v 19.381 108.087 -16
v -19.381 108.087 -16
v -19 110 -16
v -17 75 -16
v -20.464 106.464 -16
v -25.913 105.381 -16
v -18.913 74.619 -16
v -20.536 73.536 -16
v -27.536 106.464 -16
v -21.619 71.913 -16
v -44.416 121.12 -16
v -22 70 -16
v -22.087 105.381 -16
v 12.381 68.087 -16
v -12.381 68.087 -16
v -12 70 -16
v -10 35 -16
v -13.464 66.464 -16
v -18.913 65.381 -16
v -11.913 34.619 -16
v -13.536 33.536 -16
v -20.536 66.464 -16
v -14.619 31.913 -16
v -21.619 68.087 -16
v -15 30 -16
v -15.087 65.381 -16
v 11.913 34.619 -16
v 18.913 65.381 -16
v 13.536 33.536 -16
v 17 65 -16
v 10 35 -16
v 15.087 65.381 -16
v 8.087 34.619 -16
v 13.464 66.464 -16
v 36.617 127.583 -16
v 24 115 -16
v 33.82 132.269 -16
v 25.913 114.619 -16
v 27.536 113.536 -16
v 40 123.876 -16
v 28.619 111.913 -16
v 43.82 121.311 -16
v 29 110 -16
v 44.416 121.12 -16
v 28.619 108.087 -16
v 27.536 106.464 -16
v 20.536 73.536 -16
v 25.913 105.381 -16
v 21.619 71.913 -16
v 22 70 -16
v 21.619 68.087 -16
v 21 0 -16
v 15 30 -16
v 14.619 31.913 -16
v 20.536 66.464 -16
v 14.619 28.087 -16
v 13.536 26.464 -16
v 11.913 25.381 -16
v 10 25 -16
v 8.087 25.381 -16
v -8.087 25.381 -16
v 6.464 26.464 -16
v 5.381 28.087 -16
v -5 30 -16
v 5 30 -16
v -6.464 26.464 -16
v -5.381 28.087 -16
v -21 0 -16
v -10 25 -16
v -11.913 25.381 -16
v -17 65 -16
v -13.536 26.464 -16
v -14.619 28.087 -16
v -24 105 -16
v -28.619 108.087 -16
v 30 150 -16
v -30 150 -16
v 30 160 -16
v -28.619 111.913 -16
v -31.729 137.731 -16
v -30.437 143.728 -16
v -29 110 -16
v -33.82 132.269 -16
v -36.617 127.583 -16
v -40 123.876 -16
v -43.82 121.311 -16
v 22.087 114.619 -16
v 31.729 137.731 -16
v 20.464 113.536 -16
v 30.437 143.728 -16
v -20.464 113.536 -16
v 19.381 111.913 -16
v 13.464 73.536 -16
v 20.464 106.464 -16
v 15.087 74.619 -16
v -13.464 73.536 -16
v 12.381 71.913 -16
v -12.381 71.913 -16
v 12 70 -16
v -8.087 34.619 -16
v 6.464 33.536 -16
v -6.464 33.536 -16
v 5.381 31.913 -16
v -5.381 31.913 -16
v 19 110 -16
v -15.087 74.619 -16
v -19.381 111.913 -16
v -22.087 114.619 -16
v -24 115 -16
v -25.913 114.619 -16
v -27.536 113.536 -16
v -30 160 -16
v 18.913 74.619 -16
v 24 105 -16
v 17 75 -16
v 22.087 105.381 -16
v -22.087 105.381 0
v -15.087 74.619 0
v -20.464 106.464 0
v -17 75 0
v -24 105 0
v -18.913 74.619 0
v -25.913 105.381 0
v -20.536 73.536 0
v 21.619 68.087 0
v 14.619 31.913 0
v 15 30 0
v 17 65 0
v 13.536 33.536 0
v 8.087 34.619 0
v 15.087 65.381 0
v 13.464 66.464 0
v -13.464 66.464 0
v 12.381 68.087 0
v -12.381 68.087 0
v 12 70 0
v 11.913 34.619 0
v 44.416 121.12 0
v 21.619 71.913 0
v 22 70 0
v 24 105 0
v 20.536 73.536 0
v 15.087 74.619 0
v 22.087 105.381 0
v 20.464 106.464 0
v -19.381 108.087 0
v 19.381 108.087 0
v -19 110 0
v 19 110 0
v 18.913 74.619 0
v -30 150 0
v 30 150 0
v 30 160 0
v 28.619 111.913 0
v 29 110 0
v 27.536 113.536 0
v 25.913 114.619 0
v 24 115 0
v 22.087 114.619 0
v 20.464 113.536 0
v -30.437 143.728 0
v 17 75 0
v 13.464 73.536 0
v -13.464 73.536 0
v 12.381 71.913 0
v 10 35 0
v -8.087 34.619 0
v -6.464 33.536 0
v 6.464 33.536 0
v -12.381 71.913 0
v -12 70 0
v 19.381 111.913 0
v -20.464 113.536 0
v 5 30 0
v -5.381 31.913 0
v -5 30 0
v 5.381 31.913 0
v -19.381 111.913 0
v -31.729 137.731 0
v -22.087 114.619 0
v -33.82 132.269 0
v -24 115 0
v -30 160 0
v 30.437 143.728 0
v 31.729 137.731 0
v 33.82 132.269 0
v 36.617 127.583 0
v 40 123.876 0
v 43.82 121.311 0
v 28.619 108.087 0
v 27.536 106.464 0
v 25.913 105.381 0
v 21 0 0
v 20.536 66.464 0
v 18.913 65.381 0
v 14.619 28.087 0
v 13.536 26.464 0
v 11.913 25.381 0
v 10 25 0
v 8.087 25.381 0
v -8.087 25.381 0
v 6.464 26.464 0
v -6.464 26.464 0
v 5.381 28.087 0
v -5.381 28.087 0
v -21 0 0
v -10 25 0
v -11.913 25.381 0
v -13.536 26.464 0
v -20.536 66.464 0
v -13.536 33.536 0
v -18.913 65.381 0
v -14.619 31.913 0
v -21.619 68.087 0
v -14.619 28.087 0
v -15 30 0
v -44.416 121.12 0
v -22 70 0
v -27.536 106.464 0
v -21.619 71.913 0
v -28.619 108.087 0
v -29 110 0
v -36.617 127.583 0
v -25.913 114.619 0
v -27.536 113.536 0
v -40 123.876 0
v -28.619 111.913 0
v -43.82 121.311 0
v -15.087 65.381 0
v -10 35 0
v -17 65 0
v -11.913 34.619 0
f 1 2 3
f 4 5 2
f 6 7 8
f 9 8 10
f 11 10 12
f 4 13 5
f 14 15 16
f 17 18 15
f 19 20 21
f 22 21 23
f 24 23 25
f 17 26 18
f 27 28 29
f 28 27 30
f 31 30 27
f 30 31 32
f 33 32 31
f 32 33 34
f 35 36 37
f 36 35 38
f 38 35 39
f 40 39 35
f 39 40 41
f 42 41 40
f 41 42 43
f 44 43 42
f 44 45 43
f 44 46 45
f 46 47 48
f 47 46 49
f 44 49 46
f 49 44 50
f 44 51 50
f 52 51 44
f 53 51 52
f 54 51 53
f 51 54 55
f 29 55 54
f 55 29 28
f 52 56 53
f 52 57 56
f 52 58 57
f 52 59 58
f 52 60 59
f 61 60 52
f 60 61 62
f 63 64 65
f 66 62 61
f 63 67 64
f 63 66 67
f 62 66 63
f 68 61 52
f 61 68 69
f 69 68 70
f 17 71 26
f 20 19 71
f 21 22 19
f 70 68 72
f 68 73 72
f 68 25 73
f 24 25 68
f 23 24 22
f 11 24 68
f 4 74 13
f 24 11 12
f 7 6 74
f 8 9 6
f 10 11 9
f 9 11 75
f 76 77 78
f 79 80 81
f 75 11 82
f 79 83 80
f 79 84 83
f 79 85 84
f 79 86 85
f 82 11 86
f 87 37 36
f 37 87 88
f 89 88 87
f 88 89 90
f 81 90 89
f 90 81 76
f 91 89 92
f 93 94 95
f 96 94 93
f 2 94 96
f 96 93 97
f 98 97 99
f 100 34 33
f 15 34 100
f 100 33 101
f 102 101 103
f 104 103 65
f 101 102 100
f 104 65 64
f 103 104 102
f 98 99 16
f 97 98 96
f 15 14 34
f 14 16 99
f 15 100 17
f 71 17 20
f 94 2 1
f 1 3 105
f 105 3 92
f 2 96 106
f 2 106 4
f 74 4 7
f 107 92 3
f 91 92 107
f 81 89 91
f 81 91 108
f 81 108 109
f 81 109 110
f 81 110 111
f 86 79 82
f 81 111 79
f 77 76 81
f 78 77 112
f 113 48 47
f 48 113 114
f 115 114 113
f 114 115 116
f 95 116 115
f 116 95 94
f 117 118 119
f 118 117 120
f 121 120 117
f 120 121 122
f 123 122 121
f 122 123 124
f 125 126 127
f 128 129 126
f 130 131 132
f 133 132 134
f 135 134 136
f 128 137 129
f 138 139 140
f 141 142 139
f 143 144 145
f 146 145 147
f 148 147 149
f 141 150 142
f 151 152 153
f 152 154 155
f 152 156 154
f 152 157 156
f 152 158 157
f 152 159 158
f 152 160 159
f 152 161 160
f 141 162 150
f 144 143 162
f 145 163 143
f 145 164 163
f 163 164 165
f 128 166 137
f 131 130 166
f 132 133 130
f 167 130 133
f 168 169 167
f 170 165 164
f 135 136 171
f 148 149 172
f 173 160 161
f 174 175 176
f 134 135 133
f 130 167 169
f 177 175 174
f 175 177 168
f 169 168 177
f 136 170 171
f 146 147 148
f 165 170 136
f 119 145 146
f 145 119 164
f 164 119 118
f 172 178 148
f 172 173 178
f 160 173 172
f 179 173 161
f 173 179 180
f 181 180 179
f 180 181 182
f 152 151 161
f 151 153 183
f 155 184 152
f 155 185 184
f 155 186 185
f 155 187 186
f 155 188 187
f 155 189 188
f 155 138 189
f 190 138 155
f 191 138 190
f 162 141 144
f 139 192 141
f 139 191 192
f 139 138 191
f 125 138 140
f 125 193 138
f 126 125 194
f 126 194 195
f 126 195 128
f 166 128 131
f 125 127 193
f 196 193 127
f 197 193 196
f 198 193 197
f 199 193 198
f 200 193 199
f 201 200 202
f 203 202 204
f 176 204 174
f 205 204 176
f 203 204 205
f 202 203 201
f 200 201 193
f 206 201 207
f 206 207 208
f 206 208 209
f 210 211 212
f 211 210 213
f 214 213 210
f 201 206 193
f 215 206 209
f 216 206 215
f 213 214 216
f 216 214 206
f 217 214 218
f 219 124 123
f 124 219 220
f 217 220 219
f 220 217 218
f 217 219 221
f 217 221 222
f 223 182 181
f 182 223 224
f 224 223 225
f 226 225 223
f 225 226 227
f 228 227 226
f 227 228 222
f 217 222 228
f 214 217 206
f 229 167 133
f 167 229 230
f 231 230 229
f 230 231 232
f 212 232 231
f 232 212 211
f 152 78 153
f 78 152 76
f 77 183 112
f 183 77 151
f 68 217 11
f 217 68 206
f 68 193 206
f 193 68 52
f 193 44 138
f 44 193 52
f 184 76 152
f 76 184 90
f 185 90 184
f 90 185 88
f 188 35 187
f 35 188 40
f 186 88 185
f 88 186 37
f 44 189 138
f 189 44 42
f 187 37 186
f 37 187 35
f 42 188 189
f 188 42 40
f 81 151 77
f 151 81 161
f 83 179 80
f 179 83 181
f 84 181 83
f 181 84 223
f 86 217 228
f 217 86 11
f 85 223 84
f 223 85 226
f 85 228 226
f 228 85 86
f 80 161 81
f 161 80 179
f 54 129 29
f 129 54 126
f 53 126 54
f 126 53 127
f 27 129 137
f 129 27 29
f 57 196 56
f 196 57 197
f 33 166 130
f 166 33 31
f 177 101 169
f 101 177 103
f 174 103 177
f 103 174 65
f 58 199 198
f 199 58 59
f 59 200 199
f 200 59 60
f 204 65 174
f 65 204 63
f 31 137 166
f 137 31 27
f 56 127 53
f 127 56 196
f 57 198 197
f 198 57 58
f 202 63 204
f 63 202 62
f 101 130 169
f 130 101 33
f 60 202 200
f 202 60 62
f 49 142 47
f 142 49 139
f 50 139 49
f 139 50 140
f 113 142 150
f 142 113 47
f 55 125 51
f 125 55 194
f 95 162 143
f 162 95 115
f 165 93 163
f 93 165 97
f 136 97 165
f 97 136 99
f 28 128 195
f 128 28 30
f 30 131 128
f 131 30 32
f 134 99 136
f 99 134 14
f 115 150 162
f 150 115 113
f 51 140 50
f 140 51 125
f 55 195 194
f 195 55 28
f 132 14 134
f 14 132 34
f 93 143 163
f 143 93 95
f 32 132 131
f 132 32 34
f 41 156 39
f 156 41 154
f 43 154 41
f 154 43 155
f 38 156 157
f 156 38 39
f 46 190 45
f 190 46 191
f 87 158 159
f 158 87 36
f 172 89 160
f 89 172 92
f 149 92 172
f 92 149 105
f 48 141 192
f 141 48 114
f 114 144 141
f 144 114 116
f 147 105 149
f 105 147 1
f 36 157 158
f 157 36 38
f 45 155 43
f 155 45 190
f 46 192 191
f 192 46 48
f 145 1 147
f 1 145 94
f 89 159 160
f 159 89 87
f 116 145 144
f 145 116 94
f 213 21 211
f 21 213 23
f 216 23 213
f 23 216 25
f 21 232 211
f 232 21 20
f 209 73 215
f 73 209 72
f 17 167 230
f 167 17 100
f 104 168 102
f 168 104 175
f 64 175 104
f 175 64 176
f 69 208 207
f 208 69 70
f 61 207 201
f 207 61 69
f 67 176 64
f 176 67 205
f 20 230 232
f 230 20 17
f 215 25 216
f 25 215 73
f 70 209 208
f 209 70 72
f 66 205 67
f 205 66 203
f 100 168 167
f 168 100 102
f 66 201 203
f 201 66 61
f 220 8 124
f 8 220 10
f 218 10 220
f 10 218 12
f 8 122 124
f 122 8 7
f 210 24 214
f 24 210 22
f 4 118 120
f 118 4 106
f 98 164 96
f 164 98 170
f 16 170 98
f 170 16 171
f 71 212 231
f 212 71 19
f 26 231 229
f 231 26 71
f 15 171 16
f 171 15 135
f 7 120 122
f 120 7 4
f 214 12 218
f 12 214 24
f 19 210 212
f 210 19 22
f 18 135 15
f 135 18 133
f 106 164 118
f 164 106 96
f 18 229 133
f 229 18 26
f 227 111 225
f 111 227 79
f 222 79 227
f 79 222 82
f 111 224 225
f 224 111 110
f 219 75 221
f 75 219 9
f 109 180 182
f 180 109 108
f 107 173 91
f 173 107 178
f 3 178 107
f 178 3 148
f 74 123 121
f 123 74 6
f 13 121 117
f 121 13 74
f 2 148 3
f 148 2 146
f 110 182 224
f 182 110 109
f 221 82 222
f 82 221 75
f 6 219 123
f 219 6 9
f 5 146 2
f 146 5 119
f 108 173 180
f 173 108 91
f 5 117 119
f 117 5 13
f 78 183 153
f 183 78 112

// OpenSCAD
translate ([0, 0, -8]) {
  difference () {
    difference () {
      linear_extrude (height=16, center=true){
        polygon (points=[[-21, 0], [21, 0], [50, 150], [30, 150], [30, 170], [-30, 170], [-30, 150], [-50, 150]]);
      }
      translate ([50, 150, ]) {
        resize ([40, 60, 20]){
          cylinder (h=20, r=20, center=true);
        }
      }
      translate ([-50, 150, ]) {
        resize ([40, 60, 20]){
          cylinder (h=20, r=20, center=true);
        }
      }
    }
    union () {
      translate ([10, 30, ]) {
        cylinder (h=20, r=5, center=true);
      }
      translate ([17, 70, ]) {
        cylinder (h=20, r=5, center=true);
      }
      translate ([24, 110, ]) {
        cylinder (h=20, r=5, center=true);
      }
    }
    mirror ([1, 0, 0]) {
      union () {
        translate ([10, 30, ]) {
          cylinder (h=20, r=5, center=true);
        }
        translate ([17, 70, ]) {
          cylinder (h=20, r=5, center=true);
        }
        translate ([24, 110, ]) {
          cylinder (h=20, r=5, center=true);
        }
      }
    }
    translate ([0, 170, 0]) {
      cube ([100, 20, 40], center=true);
    }
  }
}
